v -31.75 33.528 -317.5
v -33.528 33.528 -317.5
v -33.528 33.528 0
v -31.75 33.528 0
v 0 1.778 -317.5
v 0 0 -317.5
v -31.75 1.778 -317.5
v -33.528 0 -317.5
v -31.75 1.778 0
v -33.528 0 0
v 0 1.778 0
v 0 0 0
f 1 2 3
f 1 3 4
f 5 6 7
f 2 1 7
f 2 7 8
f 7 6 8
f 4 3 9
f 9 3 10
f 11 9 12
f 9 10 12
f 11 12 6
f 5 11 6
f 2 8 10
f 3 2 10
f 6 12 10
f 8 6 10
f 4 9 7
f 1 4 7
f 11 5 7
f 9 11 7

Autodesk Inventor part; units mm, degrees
ref_plane "YZ Plane" through (0, 0, 0) normal (1, 0, 0) x (0, 1, 0)
ref_plane "XZ Plane" through (0, 0, 0) normal (0, 1, 0) x (-1, 0, 0)
ref_plane "XY Plane" through (0, 0, 0) normal (0, 0, 1) x (1, 0, 0)
sketch "Sketch1" plane through (0, 0, 0) normal (0, 1, 0) x (-1, 0, 0)
  line L0 (0, 0) -> (0, -317.5)
  line L1 (0, -317.5) -> (33.528, -317.5)
  line L2 (33.528, -317.5) -> (33.528, 0)
  line L3 (33.528, 0) -> (0, 0)
  dimension "d0" = 317.5
  dimension "d1" = 33.528
extrude "Extrusion1" add sketch "Sketch1" along normal blind 1.778
sketch "Sketch2" plane through (0, 1.778, 0) normal (0, 1, 0) x (1, 0, 0)
  line L0 (-33.528, 0) -> (0, 0) projected
  line L1 (-33.528, 0) -> (-31.75, 0)
  line L2 (-31.75, 0) -> (-31.75, 317.5)
  line L3 (-33.528, 317.5) -> (-33.528, 0) projected
  line L4 (-31.75, 317.5) -> (-33.528, 317.5)
  line L5 (-33.528, 317.5) -> (-33.528, 0)
  dimension "d4" = 1.778
extrude "Extrusion2" add sketch "Sketch2" along normal blind 31.75
properties part number "Long Boi" material "Steel, Alloy"
